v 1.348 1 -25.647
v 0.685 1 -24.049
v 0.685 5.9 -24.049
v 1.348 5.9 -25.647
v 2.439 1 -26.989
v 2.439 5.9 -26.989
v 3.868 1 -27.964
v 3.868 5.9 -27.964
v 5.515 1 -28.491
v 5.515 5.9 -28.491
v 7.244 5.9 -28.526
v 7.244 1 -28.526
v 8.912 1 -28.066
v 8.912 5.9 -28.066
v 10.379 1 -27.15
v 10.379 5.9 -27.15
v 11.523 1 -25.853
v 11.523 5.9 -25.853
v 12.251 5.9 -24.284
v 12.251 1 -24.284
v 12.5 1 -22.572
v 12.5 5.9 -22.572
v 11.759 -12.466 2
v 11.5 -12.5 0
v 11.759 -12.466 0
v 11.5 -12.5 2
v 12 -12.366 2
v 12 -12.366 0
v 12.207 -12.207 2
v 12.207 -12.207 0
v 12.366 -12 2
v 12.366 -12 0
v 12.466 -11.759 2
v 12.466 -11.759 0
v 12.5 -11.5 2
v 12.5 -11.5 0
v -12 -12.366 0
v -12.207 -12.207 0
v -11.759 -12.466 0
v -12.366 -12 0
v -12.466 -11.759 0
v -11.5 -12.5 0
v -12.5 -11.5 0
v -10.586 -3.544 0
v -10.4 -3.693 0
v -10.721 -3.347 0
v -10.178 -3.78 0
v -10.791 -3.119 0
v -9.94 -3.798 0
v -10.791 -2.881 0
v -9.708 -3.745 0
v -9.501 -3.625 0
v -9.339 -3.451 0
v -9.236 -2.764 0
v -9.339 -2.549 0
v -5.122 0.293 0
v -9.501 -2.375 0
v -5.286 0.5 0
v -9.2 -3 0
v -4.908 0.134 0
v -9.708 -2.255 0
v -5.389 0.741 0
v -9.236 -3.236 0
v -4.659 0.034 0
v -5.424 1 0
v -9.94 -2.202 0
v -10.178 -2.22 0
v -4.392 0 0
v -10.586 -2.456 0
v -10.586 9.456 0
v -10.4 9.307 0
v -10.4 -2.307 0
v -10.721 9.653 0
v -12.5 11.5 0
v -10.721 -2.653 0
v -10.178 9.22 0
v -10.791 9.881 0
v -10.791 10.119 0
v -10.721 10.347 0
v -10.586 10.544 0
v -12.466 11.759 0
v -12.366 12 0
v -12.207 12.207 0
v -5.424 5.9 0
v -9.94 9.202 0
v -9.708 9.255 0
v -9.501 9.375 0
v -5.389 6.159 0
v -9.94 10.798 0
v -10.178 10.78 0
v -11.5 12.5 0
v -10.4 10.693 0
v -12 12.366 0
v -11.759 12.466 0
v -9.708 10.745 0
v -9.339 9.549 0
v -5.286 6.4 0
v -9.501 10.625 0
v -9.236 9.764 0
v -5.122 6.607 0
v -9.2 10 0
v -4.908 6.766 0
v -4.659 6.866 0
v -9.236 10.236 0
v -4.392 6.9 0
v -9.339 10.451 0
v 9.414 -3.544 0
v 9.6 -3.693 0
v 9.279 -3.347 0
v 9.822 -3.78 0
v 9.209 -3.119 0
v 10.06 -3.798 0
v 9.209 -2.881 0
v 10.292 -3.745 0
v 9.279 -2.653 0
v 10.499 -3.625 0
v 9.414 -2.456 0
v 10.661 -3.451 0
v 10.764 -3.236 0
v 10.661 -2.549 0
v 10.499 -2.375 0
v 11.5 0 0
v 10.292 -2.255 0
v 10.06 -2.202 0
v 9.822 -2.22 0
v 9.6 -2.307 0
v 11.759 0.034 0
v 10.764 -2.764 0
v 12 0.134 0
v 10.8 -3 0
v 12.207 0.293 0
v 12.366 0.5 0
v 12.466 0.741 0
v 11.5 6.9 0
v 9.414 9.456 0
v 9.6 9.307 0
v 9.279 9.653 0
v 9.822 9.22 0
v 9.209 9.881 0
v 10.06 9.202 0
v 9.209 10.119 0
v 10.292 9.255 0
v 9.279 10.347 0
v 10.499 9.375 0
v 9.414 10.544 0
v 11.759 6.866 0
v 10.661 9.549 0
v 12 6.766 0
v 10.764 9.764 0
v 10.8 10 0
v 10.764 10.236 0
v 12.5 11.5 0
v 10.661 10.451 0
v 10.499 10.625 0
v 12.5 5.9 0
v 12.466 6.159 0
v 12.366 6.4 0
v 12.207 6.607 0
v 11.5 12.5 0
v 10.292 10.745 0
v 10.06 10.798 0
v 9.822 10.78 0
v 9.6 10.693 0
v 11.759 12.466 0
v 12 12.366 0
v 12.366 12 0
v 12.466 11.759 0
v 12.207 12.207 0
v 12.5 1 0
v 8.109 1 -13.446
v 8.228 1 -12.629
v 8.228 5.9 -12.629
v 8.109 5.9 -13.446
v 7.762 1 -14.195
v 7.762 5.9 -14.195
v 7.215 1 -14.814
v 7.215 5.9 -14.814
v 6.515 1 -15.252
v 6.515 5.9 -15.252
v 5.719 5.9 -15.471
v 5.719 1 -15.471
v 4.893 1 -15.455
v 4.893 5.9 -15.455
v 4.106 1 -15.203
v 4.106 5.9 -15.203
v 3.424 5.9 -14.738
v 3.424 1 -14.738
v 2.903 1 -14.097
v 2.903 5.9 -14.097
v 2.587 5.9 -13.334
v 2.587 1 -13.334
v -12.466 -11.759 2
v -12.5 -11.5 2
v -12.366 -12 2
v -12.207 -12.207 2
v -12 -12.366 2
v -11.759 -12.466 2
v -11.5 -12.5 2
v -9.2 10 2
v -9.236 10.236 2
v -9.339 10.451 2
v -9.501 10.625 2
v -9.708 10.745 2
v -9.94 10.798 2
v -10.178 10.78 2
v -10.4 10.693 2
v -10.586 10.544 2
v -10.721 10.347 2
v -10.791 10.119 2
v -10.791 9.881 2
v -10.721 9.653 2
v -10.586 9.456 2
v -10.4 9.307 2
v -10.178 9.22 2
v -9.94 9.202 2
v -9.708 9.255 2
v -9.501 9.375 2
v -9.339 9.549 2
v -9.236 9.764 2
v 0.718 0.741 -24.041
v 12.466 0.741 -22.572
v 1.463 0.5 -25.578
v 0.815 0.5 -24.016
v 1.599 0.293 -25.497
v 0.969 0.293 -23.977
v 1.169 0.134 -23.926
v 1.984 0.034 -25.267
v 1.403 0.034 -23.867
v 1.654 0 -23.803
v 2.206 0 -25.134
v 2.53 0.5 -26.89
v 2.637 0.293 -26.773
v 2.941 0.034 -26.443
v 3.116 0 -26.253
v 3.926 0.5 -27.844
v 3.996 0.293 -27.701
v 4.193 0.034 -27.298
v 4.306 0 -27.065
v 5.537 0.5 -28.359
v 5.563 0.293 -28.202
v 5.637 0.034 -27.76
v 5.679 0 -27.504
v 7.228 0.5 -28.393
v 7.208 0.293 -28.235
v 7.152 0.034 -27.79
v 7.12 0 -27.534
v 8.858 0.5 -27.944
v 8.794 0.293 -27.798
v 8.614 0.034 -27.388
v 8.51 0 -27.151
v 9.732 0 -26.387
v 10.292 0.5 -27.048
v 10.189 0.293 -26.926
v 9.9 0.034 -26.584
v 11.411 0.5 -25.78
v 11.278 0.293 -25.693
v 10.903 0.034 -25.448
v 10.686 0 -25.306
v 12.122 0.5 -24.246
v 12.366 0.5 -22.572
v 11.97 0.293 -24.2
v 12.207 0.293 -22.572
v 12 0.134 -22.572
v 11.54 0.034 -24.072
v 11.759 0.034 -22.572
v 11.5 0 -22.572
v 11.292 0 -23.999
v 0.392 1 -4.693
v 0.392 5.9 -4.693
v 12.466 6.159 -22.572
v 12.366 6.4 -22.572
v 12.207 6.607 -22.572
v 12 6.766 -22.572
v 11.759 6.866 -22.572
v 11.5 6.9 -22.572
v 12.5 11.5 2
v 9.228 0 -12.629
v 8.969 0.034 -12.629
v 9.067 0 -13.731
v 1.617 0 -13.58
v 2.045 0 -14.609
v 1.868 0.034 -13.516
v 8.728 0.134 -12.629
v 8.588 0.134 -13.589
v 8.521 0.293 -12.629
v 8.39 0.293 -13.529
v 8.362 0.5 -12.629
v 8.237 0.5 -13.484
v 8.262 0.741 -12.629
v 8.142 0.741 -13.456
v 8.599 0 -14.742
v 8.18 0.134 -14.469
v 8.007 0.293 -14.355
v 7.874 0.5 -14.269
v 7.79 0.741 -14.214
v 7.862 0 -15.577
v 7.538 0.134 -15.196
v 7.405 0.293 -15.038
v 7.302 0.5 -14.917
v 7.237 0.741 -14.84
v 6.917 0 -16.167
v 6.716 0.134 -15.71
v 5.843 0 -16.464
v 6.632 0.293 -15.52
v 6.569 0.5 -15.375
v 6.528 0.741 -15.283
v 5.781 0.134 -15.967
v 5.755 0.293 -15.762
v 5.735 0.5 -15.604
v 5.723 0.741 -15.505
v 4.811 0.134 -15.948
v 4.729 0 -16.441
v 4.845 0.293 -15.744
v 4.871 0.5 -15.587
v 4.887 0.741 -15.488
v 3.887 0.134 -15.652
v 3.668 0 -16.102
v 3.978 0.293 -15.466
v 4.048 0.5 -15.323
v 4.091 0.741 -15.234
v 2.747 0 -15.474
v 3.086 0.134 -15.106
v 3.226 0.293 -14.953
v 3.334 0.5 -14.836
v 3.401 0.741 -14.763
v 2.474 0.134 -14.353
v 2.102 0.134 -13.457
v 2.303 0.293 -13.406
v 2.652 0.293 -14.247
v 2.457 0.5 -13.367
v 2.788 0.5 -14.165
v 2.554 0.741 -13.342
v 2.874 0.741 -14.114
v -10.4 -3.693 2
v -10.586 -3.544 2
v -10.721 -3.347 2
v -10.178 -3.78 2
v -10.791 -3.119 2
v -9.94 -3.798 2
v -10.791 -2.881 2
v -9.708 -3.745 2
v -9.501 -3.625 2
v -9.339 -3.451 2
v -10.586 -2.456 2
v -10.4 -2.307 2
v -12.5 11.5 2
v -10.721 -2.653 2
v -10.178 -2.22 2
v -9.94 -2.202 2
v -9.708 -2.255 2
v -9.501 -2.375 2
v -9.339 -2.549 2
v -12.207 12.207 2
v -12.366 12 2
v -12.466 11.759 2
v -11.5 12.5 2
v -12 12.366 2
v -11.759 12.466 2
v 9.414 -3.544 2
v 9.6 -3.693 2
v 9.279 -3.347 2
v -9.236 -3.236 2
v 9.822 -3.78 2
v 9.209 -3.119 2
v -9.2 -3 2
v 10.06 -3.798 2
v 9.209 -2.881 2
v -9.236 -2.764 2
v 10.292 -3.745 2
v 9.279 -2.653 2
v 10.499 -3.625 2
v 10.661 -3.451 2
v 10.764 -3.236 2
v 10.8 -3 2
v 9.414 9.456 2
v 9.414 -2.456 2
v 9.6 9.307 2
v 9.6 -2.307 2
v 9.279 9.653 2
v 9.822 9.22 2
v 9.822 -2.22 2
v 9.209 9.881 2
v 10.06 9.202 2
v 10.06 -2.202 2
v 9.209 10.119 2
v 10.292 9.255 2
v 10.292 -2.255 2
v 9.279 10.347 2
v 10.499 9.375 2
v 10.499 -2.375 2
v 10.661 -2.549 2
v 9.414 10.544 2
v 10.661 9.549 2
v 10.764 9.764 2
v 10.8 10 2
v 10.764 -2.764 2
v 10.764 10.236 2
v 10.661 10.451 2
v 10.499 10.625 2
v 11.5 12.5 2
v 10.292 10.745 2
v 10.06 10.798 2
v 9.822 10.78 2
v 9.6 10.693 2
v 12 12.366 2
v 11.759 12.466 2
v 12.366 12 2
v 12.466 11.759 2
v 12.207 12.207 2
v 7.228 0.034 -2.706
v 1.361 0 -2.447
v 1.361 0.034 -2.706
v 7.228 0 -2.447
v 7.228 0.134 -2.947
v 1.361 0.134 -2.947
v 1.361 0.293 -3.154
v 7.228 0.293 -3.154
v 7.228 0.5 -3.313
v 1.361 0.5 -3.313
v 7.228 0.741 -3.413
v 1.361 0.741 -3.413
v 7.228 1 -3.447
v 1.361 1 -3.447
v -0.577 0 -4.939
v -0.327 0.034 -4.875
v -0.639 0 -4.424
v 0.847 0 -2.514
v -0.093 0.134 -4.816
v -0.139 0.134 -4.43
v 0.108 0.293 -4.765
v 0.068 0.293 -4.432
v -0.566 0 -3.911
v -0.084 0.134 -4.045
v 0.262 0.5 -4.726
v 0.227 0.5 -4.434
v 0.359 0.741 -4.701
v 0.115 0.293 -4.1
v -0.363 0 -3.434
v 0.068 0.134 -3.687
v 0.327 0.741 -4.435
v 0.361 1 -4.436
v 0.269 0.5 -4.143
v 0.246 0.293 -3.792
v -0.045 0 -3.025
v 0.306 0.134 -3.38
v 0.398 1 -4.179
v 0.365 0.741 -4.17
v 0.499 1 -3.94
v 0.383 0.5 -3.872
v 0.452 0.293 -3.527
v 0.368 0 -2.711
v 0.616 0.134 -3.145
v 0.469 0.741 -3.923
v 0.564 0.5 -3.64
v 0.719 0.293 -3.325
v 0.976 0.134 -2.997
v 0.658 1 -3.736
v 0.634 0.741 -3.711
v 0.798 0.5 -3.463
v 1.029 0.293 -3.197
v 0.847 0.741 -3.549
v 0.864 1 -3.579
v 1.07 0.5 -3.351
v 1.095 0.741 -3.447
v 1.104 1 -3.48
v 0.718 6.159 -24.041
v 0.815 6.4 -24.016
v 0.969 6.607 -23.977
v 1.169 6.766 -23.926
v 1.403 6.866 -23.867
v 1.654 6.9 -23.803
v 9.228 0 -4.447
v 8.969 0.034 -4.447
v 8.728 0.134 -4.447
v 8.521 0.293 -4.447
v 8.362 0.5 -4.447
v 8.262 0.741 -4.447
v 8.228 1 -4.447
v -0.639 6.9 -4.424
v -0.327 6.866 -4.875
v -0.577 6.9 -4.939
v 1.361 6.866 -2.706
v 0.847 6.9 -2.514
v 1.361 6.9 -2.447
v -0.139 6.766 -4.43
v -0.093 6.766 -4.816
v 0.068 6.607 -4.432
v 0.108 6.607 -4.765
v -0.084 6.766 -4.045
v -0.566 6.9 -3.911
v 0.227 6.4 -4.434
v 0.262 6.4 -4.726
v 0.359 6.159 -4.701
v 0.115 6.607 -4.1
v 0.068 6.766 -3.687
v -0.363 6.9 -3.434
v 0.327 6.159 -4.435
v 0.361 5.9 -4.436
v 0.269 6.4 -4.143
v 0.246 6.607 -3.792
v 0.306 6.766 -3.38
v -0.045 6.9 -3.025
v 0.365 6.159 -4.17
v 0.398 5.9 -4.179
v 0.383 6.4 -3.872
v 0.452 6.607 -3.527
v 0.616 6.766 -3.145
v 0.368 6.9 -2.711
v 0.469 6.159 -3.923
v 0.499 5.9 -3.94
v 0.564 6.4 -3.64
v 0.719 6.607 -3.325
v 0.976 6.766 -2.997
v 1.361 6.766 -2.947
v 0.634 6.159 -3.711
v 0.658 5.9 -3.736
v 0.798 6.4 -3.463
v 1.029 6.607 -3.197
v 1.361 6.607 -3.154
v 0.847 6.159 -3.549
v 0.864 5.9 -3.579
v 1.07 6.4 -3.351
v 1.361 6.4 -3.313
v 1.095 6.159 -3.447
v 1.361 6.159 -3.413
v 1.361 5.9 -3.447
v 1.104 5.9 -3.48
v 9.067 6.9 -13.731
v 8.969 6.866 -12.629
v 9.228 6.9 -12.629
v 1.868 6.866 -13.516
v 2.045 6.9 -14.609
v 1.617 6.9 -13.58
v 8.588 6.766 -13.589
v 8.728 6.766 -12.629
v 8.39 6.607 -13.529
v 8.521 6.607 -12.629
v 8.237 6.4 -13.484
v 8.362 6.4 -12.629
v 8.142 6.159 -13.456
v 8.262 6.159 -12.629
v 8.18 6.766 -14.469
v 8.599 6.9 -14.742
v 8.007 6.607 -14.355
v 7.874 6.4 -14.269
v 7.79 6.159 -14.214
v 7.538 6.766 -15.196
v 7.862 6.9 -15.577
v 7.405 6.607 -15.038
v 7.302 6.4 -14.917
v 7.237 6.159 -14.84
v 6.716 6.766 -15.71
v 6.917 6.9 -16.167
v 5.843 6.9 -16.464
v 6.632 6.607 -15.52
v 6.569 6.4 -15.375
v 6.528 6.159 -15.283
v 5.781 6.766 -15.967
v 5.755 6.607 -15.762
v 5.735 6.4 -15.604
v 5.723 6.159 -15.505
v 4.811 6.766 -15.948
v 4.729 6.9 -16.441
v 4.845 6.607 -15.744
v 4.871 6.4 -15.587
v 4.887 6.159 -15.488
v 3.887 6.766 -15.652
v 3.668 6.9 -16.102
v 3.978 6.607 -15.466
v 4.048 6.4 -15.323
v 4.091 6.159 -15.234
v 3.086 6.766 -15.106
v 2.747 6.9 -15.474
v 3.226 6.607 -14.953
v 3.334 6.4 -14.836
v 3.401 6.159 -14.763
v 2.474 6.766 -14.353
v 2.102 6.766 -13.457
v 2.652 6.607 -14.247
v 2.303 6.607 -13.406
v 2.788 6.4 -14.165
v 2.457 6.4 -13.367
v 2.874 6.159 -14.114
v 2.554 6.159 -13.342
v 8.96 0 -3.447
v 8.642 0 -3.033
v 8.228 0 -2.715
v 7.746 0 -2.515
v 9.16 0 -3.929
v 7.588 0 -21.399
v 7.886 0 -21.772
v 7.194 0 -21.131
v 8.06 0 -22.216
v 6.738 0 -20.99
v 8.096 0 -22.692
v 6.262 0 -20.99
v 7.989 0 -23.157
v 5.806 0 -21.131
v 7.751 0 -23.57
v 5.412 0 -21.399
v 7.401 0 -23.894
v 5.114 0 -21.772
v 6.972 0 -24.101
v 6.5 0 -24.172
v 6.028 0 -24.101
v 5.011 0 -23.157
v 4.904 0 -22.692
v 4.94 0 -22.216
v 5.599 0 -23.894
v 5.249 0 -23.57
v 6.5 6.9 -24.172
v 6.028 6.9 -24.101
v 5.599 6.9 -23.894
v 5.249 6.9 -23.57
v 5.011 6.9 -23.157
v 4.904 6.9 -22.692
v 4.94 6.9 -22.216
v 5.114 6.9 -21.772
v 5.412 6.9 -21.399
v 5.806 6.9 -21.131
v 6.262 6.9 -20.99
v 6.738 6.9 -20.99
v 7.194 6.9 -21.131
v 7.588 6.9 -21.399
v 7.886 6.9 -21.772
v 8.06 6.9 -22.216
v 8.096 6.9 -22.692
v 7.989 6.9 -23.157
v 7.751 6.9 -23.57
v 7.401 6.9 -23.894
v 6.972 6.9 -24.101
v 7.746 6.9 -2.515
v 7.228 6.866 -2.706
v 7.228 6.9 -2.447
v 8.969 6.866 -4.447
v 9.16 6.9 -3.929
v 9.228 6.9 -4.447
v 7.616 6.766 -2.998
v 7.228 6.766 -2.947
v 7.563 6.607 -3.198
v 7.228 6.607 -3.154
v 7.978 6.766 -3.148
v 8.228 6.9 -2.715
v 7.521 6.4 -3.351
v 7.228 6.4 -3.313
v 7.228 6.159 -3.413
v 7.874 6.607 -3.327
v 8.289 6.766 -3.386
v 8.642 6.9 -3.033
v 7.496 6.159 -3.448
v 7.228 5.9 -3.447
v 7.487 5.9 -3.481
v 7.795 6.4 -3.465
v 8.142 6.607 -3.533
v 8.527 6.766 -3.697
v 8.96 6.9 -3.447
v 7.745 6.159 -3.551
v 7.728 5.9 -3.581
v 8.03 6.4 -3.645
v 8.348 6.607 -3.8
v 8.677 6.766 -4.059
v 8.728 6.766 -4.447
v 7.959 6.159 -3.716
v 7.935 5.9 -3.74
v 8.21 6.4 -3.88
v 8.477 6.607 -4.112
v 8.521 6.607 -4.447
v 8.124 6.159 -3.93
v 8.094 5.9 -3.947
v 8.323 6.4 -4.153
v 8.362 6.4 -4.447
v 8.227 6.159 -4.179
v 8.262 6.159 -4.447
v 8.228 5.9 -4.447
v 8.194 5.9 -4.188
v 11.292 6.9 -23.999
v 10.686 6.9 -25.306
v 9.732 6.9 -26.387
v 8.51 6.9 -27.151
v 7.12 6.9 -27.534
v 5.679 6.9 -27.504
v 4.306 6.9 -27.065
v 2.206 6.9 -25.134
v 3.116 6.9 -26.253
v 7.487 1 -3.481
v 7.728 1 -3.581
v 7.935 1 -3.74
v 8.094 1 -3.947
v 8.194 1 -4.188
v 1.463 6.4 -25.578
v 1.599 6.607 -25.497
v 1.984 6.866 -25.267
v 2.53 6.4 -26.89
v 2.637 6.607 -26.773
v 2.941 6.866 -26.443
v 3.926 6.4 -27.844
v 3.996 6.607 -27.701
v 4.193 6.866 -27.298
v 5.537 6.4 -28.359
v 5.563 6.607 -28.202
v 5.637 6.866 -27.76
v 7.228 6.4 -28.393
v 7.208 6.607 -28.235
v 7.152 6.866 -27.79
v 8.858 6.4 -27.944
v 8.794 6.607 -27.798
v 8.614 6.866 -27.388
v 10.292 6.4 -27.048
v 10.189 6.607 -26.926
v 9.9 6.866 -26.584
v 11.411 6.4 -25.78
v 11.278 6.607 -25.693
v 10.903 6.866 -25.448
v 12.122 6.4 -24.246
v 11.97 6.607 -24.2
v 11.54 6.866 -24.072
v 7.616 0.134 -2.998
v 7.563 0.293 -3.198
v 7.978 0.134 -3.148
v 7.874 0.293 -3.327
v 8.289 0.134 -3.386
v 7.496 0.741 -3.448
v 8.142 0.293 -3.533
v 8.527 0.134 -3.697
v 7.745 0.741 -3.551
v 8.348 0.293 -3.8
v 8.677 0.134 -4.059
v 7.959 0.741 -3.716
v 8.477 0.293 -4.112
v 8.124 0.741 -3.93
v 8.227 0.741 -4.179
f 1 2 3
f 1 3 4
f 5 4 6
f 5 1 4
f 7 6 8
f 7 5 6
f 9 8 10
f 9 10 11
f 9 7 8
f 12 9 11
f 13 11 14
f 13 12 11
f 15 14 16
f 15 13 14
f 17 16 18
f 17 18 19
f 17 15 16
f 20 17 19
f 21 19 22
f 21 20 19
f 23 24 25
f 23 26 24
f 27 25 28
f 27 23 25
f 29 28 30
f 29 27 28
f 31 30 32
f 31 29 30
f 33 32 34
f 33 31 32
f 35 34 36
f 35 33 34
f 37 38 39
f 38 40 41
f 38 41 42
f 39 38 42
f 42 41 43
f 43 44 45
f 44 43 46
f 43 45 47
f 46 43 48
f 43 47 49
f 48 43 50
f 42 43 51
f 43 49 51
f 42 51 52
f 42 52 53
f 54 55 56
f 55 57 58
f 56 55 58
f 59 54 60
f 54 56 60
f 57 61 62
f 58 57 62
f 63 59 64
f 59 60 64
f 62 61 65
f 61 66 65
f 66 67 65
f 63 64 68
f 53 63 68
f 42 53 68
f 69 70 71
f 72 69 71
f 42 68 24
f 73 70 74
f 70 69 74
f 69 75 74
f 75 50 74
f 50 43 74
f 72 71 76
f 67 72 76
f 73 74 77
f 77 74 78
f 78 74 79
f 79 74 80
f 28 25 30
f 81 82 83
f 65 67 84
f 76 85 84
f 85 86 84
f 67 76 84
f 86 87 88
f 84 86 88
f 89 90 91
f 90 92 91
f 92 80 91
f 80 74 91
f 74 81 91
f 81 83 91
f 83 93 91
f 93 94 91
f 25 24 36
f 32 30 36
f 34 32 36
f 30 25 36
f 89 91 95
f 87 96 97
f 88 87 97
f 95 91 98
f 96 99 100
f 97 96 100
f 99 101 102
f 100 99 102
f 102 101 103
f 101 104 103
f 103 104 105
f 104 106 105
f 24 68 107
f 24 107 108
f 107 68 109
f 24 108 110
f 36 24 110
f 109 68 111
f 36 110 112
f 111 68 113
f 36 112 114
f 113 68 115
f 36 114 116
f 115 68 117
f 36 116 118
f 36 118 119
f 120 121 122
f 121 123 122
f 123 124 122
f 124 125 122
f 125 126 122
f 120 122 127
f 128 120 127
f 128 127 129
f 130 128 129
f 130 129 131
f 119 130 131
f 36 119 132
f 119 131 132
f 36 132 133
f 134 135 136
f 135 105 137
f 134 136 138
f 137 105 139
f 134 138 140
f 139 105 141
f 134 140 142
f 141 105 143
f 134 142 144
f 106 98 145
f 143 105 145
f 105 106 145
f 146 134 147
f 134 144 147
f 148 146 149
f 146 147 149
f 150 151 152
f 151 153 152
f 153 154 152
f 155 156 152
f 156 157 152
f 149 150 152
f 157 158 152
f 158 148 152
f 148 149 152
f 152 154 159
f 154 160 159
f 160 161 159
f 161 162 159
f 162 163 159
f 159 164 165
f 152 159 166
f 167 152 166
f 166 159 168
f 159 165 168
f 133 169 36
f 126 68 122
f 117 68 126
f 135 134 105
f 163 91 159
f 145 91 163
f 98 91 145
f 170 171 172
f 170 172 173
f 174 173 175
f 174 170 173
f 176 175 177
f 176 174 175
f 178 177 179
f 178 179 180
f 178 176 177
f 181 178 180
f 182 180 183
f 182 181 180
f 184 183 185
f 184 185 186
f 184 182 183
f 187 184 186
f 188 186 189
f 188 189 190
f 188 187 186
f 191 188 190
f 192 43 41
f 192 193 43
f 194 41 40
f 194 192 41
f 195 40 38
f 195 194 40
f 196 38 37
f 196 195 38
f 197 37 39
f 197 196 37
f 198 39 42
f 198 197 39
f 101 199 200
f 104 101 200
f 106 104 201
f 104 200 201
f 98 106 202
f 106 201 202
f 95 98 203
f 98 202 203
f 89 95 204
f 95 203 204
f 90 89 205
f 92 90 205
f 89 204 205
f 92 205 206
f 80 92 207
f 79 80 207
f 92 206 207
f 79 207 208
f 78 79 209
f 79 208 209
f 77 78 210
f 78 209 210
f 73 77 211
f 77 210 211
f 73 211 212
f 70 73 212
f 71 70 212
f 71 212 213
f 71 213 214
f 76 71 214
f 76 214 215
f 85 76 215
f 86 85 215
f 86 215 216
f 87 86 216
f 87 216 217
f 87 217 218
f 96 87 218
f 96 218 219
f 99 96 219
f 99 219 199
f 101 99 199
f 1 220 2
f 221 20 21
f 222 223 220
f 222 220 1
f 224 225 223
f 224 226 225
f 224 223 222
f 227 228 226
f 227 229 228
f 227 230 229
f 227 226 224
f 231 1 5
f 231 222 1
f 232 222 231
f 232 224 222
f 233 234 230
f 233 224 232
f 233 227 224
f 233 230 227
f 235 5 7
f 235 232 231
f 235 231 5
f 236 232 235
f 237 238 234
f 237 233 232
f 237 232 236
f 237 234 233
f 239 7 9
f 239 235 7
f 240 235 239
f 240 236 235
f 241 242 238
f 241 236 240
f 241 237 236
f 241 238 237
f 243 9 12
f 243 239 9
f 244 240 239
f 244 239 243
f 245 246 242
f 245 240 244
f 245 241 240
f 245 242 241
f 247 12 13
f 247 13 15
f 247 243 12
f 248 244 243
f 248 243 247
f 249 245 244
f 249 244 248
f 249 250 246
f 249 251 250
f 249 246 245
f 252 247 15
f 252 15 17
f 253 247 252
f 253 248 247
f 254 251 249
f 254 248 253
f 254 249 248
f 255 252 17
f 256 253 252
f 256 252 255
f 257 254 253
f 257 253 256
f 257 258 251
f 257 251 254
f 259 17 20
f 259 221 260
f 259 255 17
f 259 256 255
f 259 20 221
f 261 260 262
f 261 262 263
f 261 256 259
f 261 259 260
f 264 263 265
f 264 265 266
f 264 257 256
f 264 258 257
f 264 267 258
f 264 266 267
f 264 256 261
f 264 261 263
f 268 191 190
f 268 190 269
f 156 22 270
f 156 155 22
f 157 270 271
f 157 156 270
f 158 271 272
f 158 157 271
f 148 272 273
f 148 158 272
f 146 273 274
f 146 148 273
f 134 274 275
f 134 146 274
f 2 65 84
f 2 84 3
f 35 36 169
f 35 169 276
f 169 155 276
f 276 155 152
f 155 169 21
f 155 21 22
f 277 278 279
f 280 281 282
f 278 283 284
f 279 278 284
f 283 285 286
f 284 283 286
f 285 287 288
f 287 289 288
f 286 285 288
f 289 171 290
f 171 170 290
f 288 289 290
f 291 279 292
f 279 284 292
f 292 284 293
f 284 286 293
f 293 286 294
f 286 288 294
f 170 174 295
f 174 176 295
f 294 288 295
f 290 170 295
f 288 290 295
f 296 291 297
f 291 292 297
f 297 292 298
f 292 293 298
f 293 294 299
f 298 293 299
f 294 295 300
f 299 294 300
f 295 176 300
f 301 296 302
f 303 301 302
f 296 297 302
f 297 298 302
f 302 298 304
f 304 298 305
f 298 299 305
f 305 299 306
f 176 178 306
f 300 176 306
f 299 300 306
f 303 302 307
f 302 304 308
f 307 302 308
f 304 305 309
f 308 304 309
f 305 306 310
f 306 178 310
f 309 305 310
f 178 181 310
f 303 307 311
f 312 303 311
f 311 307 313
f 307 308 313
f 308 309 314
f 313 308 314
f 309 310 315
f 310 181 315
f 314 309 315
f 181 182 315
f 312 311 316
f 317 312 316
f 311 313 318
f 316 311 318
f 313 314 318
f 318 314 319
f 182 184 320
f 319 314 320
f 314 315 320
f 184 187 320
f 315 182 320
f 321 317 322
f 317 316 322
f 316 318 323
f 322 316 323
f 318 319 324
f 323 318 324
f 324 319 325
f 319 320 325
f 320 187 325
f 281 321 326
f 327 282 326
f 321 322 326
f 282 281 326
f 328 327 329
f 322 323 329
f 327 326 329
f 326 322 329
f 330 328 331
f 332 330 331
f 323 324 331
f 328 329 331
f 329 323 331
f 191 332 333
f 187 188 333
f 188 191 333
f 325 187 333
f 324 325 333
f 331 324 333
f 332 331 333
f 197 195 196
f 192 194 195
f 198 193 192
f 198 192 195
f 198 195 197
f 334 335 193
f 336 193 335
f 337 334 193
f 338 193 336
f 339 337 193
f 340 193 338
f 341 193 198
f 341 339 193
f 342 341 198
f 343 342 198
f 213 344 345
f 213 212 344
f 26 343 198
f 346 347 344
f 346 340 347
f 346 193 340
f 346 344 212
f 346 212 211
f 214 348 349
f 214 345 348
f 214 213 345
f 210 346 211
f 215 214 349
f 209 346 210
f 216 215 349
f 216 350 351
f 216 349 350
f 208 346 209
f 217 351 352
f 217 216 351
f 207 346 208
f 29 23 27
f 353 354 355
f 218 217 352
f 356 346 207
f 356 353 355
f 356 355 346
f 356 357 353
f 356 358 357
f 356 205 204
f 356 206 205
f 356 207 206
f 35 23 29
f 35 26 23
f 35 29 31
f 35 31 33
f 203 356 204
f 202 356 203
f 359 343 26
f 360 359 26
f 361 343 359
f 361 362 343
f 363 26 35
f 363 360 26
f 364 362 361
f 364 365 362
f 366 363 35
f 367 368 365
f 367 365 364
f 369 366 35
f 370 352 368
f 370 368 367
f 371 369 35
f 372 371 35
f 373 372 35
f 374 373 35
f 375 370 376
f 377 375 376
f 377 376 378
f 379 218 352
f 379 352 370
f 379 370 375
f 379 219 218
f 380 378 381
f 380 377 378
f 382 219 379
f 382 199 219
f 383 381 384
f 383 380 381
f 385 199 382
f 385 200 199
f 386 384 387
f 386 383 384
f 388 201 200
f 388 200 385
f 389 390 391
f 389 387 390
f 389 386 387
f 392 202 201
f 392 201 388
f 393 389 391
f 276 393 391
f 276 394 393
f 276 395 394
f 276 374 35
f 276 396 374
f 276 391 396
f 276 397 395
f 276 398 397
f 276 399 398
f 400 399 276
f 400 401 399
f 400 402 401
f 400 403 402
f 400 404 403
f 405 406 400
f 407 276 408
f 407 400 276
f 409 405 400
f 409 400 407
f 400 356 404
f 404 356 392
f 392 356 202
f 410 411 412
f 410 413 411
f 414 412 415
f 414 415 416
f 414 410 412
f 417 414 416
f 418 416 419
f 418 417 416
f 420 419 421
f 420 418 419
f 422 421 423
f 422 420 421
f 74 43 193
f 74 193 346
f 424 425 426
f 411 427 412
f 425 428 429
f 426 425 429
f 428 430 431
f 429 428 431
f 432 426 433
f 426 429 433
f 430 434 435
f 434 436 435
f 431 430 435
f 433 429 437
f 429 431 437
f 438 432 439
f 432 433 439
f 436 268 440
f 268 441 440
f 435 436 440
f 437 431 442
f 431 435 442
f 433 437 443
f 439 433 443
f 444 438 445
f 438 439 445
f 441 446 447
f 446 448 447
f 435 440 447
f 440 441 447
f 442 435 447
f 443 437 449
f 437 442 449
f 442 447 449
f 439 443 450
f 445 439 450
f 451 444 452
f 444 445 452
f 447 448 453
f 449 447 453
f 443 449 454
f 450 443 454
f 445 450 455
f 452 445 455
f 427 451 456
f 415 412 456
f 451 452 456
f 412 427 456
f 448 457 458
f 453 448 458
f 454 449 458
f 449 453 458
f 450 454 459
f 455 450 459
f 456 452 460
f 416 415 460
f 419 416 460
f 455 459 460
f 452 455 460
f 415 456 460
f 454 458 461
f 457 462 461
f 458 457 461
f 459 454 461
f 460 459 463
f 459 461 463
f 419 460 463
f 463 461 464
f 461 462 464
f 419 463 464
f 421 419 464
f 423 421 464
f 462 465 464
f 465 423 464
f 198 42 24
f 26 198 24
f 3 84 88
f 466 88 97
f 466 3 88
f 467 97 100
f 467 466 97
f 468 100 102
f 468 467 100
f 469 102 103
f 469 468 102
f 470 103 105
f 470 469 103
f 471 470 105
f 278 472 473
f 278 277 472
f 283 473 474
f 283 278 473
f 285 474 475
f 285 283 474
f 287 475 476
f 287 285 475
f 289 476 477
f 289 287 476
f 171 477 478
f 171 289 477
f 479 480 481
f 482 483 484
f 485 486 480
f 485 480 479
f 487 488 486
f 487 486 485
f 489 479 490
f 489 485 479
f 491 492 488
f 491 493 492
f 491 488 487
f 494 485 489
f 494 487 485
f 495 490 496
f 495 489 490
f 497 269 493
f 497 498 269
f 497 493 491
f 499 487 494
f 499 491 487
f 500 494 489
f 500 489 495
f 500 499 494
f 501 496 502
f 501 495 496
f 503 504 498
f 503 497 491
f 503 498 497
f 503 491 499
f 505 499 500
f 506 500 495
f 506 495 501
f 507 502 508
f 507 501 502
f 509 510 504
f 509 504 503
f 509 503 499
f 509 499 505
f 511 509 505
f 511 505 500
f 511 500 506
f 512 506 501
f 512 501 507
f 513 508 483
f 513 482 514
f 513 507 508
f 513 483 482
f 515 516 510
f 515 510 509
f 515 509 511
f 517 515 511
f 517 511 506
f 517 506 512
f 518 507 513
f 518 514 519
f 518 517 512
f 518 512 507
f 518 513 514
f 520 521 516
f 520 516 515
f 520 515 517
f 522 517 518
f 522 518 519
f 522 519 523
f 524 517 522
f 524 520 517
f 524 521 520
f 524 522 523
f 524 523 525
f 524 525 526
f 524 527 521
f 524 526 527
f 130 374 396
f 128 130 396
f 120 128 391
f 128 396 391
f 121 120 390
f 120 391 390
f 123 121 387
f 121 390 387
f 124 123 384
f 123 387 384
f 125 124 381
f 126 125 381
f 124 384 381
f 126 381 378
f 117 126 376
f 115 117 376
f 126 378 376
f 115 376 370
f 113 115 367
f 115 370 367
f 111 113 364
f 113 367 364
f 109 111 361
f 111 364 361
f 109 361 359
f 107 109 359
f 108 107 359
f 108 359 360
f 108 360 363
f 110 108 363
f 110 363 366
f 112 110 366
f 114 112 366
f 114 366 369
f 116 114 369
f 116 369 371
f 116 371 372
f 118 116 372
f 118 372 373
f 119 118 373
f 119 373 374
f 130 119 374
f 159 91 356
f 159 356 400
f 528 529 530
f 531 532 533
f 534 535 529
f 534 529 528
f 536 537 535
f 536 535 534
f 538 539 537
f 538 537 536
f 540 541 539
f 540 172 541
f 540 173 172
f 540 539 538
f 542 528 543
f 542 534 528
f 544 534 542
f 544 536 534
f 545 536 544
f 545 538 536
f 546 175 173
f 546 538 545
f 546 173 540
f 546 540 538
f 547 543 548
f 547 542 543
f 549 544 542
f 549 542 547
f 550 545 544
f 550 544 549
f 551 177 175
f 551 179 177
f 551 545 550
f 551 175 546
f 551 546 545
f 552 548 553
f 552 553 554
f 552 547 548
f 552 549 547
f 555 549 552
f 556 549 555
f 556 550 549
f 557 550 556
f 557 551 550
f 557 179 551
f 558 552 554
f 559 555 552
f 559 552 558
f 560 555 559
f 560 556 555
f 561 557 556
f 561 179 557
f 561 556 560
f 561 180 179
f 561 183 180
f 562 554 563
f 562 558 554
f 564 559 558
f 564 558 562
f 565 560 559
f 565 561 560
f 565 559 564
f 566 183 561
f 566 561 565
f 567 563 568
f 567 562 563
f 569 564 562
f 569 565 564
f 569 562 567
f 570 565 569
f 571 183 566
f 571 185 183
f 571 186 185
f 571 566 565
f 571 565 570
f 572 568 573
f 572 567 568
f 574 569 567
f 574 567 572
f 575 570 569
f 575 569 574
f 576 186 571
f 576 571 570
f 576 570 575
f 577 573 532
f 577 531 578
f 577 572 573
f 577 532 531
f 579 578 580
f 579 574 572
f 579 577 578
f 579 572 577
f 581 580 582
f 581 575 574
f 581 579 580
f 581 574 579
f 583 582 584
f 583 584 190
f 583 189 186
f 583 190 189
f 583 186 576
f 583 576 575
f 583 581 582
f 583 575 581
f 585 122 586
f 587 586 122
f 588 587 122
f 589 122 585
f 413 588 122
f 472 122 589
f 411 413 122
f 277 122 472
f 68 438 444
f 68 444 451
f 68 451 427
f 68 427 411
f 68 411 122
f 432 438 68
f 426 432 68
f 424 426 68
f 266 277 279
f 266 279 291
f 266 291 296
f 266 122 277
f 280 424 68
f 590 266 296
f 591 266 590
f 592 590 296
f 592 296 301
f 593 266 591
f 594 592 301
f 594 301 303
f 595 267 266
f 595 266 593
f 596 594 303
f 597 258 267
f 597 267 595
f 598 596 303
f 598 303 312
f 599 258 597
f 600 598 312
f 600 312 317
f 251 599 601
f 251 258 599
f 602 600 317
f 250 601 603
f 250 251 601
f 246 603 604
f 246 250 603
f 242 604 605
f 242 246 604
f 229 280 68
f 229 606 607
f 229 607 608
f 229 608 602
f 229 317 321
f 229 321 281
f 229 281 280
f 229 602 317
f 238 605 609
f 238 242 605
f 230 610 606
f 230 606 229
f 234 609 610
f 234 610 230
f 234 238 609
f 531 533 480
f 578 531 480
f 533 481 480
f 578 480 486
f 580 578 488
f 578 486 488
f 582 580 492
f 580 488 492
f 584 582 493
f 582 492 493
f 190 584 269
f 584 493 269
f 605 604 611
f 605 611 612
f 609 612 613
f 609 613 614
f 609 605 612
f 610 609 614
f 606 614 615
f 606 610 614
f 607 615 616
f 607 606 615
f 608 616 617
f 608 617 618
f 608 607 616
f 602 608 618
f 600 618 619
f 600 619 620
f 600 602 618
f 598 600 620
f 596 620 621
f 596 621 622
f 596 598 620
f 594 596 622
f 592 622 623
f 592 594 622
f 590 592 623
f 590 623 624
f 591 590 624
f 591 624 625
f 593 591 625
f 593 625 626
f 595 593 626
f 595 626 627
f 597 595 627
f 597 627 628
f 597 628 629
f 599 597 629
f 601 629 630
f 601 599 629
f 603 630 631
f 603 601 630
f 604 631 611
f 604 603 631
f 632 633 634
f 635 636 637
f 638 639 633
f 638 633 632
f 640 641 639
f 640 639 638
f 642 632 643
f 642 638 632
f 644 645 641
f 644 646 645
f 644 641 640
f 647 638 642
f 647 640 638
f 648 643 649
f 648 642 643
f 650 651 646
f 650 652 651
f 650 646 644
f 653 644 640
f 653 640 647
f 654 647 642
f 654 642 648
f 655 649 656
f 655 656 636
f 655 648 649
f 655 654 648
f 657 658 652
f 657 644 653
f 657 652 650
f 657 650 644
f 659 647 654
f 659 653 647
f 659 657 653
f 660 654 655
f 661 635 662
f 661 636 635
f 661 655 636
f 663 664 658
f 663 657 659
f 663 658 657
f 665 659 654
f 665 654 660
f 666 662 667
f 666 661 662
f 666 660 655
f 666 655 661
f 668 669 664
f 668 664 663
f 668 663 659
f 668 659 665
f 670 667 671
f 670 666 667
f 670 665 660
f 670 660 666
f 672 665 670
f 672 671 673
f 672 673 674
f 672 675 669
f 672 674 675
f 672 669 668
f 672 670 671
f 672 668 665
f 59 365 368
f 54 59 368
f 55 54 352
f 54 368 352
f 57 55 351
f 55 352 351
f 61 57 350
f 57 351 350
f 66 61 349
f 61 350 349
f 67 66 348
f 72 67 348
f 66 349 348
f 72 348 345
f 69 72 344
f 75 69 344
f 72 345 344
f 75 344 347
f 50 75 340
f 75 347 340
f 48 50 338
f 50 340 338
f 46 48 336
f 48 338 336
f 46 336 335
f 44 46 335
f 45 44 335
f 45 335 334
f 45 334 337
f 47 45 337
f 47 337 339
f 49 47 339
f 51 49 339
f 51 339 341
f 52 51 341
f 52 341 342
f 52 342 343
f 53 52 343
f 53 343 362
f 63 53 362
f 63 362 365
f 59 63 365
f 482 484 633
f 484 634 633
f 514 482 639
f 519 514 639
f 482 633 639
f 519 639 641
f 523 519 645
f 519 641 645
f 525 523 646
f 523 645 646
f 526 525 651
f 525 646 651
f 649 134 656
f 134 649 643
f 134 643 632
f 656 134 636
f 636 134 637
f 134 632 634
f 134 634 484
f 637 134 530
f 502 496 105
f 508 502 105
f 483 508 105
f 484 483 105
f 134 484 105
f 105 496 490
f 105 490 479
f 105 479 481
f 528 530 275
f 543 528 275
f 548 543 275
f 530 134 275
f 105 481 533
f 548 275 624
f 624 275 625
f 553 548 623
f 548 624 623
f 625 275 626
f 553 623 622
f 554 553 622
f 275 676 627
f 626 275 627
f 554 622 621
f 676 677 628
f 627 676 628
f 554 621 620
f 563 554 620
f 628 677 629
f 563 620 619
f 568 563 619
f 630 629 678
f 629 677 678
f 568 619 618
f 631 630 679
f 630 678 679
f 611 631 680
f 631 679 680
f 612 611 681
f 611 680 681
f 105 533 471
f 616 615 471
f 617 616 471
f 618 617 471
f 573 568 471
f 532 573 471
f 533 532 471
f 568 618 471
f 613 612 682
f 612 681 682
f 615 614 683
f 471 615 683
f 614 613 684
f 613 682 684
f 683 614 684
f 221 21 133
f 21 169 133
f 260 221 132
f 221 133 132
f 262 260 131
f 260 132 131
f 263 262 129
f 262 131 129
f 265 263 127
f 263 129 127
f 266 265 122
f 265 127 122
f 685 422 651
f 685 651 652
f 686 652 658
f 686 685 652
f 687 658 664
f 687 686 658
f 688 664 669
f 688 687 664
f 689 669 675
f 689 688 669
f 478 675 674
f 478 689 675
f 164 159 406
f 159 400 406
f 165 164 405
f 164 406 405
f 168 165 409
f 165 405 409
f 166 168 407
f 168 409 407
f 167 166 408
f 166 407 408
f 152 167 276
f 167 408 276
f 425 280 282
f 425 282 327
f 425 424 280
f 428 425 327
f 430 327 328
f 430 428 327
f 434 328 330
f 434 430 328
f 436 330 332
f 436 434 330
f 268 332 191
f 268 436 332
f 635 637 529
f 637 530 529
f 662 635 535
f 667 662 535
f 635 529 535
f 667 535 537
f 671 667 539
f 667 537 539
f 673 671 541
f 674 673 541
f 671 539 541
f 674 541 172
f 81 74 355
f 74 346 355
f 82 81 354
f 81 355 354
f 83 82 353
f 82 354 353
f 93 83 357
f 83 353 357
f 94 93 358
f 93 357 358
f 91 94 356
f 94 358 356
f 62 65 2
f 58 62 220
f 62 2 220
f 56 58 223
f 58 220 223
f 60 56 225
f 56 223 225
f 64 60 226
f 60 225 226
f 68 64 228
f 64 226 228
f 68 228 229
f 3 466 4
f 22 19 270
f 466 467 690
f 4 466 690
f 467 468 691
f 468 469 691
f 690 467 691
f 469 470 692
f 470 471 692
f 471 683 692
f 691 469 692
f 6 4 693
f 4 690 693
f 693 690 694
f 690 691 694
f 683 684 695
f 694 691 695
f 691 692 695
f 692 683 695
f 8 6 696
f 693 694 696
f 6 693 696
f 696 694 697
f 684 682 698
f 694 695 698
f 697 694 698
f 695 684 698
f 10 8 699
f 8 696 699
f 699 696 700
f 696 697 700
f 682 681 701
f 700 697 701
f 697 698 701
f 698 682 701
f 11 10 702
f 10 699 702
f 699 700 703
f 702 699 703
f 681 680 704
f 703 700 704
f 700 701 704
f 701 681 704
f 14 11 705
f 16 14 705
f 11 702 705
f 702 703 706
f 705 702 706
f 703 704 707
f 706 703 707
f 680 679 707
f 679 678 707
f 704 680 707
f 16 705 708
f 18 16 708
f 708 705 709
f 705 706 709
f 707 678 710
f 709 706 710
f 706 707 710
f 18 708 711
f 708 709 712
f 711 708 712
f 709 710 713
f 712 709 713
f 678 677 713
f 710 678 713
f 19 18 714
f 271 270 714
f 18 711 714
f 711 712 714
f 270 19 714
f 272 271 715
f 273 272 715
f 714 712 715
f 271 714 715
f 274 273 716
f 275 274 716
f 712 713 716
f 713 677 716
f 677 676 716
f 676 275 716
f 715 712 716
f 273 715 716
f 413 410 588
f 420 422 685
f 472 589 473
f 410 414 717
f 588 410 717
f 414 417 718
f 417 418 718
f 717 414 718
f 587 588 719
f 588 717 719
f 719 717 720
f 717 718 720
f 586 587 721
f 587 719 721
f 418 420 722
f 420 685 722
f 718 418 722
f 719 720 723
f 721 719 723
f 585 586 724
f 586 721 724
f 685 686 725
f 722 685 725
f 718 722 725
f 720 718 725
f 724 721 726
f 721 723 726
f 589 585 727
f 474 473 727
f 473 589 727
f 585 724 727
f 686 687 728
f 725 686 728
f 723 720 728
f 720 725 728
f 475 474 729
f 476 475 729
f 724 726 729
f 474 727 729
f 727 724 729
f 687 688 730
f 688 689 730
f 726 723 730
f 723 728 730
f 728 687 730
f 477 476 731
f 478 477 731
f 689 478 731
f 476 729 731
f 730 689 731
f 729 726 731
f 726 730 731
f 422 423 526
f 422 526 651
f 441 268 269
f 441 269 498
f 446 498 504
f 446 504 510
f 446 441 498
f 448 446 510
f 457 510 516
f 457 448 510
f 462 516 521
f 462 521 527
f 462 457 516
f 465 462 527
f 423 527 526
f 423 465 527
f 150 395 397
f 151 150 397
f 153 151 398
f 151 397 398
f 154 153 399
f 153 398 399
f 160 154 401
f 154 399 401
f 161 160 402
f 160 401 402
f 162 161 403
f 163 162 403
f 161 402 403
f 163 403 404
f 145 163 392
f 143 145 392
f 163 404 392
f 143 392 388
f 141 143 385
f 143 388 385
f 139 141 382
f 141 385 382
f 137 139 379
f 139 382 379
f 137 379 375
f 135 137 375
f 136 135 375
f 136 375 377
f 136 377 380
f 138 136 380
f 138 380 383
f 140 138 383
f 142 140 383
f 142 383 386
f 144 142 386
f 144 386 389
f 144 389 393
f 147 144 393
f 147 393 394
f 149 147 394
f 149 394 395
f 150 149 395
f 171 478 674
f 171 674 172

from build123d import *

# Parameters (mm, degrees)
SKETCH1_W            = 25
SKETCH1_H            = 25
BOSS_EXTRUDE1_DEPTH  = 2
SKETCH2_R            = 0.8
CUT_EXTRUDE1_DEPTH   = 18.790446875
LPATTERN1_COUNT      = 2
LPATTERN1_PITCH      = 20
LPATTERN1_COUNT_DIR2 = 2
LPATTERN1_PITCH_DIR2 = 13
SKETCH3_R            = 1.6
BOSS_EXTRUDE2_DEPTH  = 6.9
FILLET1_R            = 1


with BuildPart() as part:
    # Sketch1 → Boss-Extrude1 (new body)
    with BuildSketch(Plane.XY):
        Rectangle(SKETCH1_W, SKETCH1_H)
    extrude(amount=BOSS_EXTRUDE1_DEPTH)

    # Sketch2 → Cut-Extrude1 (cut, through all)
    with BuildSketch(Plane.XY.offset(2)):
        with Locations((-10, 10)):
            Circle(SKETCH2_R)
    cut_extrude1 = extrude(amount=-CUT_EXTRUDE1_DEPTH, mode=Mode.SUBTRACT)

    # LPattern1: Cut-Extrude1 2 × 2
    with Locations(*[(i * LPATTERN1_PITCH, -j * LPATTERN1_PITCH_DIR2, 0) for i in range(LPATTERN1_COUNT) for j in range(LPATTERN1_COUNT_DIR2) if (i, j) != (0, 0)]):
        add(cut_extrude1, mode=Mode.SUBTRACT)

    # Sketch3 → Boss-Extrude2 (add)
    with BuildSketch(Plane(origin=(0, 0, 0), x_dir=(1, 0, 0), z_dir=(0, 1, 0))):
        with BuildLine():
            Line((12.5, 0), (-5.42402052, 0))
            Line((-5.42402052, 0), (0.684667897, 24.049376833))
            ThreePointArc((0.684667897, 24.049376833), (7.244314241, 28.525901035), (12.5, 22.572247005))
            Line((12.5, 22.572247005), (12.5, 0))
        make_face()
        with Locations(Location((6.5, 22.572247005, 0), (0, 0, 90))):
            Circle(SKETCH3_R, mode=Mode.SUBTRACT)
        with BuildLine():
            Line((1.361051754, 3.446753303), (7.227967943, 3.446753303))
            ThreePointArc((7.227967943, 3.446753303), (7.935074725, 3.739646522), (8.227967943, 4.446753303))
            Line((8.227967943, 4.446753303), (8.227967943, 12.628736978))
            ThreePointArc((8.227967943, 12.628736978), (5.718628608, 15.471322881), (2.586710272, 13.333996035))
            Line((2.586710272, 13.333996035), (0.391829737, 4.692941607))
            ThreePointArc((0.391829737, 4.692941607), (0.571688623, 3.832826721), (1.361051754, 3.446753303))
        make_face(mode=Mode.SUBTRACT)
    extrude(amount=BOSS_EXTRUDE2_DEPTH)

    # Fillet1
    fillet1_edges = [part.edges().sort_by_distance(p)[0] for p in [
        (12.5, 6.9, -11.286123503),
        (7.244314241, 6.9, -28.525901035),
        (-2.369676312, 6.9, -12.024688416),
        (8.227967943, 0, -8.53774514),
        (5.718628608, 0, -15.471322881),
        (1.489270004, 0, -9.013468821),
        (0.571688623, 0, -3.832826721),
        (4.294509849, 0, -3.446753303),
        (7.935074725, 0, -3.739646522),
        (12.5, 0, -11.286123503),
        (7.244314241, 0, -28.525901035),
        (-2.369676312, 0, -12.024688416),
        (5.718628608, 6.9, -15.471322881),
        (1.489270004, 6.9, -9.013468821),
        (0.571688623, 6.9, -3.832826721),
        (4.294509849, 6.9, -3.446753303),
        (7.935074725, 6.9, -3.739646522),
        (8.227967943, 6.9, -8.53774514),
        (12.5, -12.5, 1),
        (-12.5, -12.5, 1),
        (-12.5, 12.5, 1),
        (12.5, 12.5, 1),
    ]]
    fillet(fillet1_edges, radius=FILLET1_R)


solid = part.part
